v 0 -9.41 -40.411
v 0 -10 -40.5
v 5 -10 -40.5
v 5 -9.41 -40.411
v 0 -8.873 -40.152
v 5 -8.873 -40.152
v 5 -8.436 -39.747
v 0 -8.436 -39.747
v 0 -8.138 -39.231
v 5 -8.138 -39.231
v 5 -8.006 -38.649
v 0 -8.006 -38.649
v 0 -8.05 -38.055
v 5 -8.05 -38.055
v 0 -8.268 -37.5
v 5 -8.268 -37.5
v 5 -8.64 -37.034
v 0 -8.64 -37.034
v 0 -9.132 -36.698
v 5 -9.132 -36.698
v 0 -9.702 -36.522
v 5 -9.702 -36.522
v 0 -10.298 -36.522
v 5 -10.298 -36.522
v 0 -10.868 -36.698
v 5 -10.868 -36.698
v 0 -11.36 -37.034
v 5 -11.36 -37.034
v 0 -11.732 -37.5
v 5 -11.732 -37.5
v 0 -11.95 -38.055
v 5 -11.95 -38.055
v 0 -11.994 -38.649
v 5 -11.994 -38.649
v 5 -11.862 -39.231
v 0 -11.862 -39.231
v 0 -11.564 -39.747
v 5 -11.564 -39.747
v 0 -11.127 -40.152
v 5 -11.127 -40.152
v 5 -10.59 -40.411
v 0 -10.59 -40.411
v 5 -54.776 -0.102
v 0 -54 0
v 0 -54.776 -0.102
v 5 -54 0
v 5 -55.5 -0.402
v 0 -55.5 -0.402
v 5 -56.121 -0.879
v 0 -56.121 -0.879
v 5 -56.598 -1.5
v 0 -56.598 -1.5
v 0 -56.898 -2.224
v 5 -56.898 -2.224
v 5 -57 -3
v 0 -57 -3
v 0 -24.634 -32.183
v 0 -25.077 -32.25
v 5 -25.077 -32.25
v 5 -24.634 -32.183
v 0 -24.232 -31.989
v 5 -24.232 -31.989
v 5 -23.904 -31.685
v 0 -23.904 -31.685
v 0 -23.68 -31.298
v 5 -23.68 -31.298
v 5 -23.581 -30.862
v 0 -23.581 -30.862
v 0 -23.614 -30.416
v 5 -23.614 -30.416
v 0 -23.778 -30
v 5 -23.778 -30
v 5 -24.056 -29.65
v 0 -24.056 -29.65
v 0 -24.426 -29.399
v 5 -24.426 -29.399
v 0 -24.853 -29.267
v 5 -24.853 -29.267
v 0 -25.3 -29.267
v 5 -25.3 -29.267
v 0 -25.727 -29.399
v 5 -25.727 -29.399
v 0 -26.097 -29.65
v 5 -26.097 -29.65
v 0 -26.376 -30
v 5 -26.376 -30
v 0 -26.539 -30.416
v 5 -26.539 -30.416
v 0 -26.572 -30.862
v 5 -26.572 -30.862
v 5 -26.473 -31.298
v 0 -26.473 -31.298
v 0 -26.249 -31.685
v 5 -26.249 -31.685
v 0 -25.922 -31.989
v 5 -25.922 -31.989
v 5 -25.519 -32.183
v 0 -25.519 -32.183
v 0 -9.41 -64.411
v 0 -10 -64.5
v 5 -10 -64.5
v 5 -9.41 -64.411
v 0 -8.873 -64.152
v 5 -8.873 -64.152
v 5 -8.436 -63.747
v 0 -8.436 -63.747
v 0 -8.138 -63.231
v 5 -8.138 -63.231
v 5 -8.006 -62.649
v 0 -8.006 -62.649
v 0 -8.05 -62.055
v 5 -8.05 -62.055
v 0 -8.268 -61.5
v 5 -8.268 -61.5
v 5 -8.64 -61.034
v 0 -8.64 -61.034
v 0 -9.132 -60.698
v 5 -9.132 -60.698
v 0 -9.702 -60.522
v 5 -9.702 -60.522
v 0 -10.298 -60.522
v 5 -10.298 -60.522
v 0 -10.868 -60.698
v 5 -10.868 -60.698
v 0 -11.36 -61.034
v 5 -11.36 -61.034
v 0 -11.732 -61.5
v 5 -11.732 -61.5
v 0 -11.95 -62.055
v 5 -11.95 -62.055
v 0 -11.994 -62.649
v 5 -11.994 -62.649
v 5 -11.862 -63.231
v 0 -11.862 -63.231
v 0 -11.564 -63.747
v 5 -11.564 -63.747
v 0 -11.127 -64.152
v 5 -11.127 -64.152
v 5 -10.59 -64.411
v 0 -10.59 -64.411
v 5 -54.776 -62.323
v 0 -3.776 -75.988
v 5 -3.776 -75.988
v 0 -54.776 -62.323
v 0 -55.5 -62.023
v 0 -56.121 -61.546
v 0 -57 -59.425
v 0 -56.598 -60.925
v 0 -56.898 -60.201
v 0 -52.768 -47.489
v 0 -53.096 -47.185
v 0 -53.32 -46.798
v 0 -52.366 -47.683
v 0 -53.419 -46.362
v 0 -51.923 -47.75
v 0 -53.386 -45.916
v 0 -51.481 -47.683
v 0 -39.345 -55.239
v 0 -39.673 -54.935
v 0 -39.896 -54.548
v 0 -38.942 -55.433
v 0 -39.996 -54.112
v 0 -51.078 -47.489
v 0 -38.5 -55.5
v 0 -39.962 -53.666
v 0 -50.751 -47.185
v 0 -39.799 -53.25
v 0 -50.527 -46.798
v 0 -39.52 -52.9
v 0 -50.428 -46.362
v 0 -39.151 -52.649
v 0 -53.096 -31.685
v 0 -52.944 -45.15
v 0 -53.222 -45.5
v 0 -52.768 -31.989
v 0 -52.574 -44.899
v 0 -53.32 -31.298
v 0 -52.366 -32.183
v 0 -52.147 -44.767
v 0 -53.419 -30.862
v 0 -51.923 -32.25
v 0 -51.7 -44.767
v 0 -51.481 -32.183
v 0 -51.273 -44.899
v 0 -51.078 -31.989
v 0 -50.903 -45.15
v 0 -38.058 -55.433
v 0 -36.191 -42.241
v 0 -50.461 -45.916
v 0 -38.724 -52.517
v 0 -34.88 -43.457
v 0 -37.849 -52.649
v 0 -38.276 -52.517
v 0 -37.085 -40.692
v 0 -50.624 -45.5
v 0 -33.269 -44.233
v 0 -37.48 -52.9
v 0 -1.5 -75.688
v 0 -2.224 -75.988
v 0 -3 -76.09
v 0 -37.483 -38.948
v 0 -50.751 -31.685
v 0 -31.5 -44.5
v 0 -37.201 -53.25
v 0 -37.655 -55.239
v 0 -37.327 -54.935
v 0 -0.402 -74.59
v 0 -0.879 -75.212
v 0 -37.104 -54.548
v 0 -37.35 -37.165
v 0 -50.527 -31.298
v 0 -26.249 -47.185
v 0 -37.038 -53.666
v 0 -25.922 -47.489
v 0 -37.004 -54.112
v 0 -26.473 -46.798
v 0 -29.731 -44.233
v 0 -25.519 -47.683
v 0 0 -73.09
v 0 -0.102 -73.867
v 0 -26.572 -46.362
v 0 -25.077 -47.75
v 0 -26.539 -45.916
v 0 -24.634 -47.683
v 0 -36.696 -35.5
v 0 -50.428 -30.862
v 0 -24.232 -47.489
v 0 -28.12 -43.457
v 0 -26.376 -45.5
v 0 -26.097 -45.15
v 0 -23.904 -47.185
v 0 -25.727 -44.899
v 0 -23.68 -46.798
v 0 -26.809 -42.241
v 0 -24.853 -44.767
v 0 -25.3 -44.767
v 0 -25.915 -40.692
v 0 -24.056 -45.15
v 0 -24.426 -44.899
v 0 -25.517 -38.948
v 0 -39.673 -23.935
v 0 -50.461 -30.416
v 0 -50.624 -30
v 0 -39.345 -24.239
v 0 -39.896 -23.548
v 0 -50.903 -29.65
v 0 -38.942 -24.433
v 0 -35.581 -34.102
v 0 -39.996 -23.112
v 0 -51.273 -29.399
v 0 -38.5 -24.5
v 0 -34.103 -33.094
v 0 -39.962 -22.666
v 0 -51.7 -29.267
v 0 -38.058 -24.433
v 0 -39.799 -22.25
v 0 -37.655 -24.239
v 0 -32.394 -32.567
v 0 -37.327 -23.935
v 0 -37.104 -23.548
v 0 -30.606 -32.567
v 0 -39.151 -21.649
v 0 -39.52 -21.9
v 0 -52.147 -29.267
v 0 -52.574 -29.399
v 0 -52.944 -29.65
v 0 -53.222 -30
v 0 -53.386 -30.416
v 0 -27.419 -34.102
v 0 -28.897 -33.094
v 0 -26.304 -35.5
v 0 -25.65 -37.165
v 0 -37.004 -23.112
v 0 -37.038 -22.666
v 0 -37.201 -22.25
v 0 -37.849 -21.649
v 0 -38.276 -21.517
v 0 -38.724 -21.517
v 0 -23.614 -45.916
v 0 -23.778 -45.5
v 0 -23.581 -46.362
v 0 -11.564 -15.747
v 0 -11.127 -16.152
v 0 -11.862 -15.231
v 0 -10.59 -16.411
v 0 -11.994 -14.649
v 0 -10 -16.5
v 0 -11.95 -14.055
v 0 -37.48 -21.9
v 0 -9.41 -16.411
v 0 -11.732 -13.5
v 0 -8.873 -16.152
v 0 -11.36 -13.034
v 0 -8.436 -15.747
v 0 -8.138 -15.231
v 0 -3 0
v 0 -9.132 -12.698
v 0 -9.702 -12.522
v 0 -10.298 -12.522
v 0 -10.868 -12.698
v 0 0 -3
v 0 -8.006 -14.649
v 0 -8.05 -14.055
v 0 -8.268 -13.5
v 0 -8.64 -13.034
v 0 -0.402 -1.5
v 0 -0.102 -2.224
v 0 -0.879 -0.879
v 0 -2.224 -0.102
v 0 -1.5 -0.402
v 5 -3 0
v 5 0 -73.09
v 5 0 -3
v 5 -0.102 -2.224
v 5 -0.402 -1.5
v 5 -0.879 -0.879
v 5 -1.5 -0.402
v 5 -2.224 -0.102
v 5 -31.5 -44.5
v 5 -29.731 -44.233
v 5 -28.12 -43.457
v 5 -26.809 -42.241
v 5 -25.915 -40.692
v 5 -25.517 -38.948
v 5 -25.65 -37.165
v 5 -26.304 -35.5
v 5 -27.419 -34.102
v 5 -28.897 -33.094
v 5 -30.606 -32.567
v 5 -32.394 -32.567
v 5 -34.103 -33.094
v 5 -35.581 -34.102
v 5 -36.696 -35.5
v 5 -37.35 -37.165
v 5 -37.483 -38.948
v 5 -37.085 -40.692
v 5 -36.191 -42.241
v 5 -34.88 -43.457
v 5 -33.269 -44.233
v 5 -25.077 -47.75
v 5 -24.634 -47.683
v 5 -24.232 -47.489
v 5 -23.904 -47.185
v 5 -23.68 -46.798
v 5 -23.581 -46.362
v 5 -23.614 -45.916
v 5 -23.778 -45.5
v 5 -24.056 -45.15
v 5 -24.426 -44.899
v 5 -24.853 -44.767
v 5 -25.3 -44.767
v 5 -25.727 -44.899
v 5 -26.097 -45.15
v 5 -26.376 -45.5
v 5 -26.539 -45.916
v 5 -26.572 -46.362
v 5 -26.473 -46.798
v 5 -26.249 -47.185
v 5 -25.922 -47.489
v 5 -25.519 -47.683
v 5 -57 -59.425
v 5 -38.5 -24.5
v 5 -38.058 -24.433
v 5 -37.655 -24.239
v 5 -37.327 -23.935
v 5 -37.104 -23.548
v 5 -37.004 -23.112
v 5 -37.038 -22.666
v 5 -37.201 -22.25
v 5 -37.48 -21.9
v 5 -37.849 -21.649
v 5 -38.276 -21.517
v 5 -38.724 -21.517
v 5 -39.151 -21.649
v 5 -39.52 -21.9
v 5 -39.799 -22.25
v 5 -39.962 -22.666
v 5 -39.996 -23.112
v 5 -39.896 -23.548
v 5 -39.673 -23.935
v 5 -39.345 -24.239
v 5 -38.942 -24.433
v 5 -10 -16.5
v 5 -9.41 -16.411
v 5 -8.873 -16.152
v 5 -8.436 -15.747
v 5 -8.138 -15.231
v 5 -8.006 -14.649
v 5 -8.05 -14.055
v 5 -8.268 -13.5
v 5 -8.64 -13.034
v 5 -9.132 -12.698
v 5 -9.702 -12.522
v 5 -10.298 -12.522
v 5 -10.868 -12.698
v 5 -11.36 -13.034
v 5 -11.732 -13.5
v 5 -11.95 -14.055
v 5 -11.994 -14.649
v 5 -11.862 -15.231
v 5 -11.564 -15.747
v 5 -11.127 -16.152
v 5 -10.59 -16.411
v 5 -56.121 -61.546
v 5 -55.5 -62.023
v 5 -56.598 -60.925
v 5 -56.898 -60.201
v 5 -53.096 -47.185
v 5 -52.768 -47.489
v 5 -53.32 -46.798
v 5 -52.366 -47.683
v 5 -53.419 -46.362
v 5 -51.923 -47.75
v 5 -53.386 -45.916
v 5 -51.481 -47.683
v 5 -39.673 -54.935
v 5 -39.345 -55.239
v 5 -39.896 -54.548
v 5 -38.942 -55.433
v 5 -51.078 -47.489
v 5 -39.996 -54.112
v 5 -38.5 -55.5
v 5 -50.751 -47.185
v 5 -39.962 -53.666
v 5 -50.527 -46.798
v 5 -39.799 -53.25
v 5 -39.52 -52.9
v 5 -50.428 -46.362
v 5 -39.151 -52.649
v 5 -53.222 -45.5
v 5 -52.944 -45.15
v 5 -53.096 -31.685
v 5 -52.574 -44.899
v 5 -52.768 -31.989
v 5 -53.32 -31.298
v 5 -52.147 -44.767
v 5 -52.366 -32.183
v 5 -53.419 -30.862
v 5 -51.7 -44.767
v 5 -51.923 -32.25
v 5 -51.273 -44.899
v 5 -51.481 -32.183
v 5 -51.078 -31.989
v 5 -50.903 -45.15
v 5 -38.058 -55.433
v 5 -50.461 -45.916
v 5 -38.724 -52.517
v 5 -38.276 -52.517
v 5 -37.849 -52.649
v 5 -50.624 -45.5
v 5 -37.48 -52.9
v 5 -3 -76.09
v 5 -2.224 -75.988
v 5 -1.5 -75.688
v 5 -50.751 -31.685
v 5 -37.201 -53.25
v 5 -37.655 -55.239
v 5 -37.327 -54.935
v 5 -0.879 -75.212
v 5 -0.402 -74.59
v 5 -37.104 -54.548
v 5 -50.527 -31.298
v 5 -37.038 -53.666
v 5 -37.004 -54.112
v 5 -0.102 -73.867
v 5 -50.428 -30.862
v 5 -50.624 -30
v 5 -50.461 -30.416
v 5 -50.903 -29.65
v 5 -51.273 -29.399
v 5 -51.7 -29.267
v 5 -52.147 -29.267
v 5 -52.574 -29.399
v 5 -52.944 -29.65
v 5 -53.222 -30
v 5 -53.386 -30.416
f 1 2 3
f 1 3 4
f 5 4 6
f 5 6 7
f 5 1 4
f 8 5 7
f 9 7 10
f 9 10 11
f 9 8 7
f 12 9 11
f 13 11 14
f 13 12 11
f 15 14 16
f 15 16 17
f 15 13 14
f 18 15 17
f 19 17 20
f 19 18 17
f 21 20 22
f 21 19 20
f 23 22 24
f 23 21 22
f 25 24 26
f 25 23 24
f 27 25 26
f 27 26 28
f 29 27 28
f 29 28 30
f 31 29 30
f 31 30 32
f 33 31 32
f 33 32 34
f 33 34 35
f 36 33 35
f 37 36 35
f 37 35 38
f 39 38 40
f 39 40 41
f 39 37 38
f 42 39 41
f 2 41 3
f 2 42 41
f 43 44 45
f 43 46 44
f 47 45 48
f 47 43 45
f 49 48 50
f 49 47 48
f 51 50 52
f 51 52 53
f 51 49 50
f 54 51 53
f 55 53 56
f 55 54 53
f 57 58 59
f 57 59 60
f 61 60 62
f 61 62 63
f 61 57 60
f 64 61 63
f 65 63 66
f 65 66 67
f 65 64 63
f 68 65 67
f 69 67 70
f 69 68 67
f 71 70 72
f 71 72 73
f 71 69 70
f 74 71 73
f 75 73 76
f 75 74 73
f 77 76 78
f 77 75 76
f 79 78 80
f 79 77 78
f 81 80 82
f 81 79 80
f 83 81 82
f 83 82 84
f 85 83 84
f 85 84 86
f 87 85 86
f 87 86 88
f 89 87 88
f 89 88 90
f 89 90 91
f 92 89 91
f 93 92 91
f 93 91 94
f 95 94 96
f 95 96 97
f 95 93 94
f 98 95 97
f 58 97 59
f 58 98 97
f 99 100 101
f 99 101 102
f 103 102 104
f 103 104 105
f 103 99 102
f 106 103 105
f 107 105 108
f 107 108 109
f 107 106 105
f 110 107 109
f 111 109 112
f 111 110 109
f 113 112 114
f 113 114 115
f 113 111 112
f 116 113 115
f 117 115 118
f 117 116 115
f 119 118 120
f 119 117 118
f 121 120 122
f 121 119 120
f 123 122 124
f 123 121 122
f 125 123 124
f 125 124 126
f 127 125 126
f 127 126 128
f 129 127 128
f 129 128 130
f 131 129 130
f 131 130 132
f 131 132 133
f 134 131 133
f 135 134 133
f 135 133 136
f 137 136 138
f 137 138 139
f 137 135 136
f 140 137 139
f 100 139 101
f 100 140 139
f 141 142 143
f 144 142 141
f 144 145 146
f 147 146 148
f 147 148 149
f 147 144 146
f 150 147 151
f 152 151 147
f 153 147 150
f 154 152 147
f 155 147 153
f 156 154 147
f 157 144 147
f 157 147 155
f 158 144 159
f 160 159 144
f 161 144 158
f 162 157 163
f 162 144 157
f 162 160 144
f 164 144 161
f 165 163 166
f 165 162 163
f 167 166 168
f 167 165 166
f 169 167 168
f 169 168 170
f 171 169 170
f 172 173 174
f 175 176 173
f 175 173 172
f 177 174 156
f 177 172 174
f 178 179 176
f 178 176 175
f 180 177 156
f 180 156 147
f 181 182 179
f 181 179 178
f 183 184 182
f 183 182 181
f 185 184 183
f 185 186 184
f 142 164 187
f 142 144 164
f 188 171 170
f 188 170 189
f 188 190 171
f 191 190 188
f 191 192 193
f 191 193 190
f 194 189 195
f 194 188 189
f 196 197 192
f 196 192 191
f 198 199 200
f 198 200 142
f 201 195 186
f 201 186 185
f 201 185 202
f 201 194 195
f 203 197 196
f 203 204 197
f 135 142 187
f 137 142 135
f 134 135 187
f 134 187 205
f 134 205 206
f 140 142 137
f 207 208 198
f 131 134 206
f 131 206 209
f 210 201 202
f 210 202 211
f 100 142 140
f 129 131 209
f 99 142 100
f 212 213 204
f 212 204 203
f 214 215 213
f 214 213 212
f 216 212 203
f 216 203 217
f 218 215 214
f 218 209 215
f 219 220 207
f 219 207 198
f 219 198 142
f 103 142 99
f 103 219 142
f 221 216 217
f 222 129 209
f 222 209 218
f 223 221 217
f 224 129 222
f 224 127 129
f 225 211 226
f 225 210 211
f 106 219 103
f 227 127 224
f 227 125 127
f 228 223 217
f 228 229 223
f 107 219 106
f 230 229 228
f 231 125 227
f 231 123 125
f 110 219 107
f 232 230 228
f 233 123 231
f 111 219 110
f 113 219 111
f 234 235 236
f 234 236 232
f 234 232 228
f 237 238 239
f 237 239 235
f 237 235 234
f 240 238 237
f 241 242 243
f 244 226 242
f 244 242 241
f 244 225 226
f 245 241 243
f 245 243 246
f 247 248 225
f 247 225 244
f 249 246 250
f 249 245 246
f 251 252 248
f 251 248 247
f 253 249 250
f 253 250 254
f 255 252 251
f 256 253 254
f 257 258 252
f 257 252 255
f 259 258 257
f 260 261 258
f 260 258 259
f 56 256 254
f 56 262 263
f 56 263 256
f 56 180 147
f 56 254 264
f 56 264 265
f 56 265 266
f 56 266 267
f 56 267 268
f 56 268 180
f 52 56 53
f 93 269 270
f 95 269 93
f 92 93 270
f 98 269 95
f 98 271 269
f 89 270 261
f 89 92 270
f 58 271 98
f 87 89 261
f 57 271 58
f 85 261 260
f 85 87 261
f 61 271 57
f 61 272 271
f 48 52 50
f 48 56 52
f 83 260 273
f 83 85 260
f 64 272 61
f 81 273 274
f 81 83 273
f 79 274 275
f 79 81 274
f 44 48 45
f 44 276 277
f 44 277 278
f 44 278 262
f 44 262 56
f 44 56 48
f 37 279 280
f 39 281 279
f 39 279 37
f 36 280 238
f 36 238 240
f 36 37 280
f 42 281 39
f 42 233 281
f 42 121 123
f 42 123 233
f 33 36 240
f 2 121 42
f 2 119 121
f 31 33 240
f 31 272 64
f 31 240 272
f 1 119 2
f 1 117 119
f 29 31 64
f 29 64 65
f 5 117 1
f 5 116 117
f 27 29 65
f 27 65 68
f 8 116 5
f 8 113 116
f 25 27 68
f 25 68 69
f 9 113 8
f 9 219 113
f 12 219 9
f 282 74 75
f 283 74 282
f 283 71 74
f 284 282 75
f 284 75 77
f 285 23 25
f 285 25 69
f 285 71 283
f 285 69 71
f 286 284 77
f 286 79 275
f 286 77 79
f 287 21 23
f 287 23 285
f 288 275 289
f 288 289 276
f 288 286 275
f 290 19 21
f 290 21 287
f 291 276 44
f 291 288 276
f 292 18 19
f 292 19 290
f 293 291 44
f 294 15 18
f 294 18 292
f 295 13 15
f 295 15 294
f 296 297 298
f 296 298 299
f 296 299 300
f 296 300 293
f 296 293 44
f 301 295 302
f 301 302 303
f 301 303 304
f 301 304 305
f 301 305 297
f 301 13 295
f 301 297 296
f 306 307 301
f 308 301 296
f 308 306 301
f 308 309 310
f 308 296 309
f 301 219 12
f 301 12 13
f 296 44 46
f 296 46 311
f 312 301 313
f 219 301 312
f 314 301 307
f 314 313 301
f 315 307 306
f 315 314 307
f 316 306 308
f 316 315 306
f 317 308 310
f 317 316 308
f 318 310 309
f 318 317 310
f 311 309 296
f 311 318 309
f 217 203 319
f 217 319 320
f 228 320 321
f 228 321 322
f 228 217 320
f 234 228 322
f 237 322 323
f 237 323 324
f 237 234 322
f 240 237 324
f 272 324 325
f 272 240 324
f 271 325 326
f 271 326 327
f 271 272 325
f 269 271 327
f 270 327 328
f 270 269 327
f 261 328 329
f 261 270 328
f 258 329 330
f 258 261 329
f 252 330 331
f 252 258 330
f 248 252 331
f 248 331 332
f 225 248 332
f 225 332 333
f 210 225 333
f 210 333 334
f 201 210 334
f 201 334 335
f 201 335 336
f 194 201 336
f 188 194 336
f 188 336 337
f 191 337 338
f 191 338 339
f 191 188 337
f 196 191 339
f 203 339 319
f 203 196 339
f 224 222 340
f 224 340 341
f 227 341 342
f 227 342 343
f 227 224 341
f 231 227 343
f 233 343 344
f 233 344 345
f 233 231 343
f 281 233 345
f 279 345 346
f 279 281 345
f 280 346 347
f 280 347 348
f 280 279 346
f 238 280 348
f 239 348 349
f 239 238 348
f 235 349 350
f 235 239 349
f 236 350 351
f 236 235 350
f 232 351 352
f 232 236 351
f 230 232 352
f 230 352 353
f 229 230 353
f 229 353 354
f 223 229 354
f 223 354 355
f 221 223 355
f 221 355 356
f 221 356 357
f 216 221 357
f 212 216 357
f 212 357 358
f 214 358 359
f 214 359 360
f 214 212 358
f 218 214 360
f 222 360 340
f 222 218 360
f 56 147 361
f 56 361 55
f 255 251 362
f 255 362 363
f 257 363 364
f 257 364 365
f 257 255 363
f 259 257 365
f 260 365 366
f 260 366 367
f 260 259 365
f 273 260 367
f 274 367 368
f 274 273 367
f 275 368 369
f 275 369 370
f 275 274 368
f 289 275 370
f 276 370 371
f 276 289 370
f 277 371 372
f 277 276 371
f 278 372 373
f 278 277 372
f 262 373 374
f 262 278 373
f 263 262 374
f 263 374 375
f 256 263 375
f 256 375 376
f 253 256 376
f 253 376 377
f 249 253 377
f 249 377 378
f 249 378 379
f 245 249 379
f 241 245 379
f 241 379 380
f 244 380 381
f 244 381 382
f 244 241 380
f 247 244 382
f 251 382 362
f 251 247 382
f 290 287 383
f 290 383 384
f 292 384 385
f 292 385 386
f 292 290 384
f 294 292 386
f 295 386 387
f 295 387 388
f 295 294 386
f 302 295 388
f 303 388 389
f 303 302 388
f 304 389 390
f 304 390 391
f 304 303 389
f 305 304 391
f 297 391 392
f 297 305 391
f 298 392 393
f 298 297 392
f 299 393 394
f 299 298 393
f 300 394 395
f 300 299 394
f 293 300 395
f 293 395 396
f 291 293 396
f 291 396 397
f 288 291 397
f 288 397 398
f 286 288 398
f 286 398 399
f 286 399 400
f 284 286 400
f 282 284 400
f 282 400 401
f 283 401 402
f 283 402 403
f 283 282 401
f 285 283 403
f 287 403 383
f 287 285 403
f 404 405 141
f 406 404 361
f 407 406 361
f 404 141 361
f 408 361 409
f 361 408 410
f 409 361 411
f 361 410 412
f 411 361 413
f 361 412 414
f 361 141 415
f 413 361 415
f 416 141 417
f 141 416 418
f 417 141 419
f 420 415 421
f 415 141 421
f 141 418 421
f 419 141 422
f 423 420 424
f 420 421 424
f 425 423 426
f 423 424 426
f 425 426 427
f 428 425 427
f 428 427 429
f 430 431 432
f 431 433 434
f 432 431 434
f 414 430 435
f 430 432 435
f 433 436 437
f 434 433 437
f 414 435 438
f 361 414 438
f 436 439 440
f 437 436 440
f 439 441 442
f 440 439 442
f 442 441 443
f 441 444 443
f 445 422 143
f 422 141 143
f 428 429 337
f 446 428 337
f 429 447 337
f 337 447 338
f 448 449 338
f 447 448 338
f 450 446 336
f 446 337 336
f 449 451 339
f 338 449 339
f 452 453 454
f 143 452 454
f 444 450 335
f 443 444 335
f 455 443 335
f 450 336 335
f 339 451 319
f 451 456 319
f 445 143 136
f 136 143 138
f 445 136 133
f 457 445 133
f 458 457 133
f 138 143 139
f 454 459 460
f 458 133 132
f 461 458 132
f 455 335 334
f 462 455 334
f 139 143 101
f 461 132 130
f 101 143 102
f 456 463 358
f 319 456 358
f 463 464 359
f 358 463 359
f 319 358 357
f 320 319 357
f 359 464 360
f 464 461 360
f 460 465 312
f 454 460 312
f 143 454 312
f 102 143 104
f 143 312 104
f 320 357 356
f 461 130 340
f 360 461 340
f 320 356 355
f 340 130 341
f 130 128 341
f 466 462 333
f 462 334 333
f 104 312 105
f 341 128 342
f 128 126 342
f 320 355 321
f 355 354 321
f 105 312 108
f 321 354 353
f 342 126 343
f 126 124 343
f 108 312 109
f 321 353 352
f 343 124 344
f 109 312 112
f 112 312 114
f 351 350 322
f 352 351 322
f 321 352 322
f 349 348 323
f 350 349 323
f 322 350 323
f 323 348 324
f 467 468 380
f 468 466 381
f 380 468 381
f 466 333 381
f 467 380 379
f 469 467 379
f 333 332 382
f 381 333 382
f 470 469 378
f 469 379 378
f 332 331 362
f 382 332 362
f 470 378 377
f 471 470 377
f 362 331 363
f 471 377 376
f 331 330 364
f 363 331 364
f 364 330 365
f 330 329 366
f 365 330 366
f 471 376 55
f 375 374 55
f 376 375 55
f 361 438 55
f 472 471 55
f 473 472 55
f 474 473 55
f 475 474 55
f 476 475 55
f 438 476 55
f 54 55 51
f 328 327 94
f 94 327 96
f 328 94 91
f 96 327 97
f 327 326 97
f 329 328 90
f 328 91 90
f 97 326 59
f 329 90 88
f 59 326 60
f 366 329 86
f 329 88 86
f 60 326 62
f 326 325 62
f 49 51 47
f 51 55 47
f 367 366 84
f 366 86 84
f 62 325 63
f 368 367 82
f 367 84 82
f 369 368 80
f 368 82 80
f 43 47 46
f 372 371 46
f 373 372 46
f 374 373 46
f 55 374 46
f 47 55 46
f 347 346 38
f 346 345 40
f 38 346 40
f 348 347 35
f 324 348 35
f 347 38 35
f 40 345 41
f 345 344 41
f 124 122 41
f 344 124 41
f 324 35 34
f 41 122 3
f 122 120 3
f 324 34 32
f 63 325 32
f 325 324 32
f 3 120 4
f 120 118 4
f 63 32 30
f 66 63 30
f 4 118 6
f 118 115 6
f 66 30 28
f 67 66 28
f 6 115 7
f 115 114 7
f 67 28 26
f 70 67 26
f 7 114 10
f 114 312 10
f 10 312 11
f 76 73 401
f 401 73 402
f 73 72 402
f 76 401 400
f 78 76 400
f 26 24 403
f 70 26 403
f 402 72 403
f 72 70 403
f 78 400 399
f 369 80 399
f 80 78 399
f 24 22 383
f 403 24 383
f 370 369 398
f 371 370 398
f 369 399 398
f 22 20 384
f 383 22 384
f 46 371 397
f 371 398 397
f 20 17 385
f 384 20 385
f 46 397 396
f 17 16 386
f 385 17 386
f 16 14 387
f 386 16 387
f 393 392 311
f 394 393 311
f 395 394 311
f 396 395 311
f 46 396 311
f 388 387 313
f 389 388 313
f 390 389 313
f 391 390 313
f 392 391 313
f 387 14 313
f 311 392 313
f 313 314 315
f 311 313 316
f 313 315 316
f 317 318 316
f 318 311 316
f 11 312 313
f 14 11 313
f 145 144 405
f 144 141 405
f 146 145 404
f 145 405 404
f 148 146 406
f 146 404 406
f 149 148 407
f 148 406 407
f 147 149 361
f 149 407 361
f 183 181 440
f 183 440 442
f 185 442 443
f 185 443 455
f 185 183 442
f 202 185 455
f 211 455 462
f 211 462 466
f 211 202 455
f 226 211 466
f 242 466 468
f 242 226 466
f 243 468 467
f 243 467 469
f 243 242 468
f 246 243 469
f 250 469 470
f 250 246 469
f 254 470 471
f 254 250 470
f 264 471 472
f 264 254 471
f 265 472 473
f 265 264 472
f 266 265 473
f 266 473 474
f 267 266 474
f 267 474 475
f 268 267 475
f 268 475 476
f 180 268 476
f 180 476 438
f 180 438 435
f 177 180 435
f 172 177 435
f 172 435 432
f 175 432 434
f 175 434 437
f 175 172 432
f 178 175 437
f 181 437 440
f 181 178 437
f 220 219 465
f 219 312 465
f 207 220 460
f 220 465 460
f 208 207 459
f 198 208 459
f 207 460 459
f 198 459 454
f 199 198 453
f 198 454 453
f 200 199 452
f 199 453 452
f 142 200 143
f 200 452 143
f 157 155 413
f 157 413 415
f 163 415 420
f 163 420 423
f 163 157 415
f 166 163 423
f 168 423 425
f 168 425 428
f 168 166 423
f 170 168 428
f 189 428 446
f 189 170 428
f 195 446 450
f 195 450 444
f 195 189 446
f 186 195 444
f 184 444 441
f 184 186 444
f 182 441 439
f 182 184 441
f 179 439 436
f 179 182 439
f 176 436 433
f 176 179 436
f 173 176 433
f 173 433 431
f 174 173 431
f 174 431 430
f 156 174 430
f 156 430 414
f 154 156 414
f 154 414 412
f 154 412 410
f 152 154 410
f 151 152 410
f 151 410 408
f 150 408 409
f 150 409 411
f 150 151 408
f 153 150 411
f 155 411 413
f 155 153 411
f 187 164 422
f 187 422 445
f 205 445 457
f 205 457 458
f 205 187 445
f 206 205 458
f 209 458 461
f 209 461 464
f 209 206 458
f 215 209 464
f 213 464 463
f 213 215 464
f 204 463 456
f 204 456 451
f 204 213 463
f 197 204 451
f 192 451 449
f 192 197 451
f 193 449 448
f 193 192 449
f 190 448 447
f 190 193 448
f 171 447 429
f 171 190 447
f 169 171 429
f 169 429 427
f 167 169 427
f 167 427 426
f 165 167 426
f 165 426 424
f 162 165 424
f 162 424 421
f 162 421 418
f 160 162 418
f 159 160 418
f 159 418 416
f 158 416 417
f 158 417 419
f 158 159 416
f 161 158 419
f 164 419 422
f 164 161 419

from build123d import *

# Parameters (mm, degrees)
SKETCH1_R           = 6
SKETCH1_R_2         = 2
SKETCH1_R_3         = 1.5
BOSS_EXTRUDE1_DEPTH = 5
FILLET1_R           = 3


with BuildPart() as part:
    # Sketch1 → Boss-Extrude1 (new body)
    with BuildSketch(Plane(origin=(0, 0, 0), x_dir=(0, 0, -1), z_dir=(1, 0, 0))):
        Polygon((0, 0), (77, 0), (61.726896031, -57), (0, -57), align=None)
        with Locations((38.5, -31.5)):
            Circle(SKETCH1_R, mode=Mode.SUBTRACT)
        with Locations((38.5, -10)):
            Circle(SKETCH1_R_2, mode=Mode.SUBTRACT)
        with Locations((62.5, -10)):
            Circle(SKETCH1_R_2, mode=Mode.SUBTRACT)
        with Locations((14.5, -10)):
            Circle(SKETCH1_R_2, mode=Mode.SUBTRACT)
        with Locations((23, -38.5)):
            Circle(SKETCH1_R_3, mode=Mode.SUBTRACT)
        with Locations((30.75, -25.076606241)):
            Circle(SKETCH1_R_3, mode=Mode.SUBTRACT)
        with Locations((46.25, -25.076606241)):
            Circle(SKETCH1_R_3, mode=Mode.SUBTRACT)
        with Locations((54, -38.5)):
            Circle(SKETCH1_R_3, mode=Mode.SUBTRACT)
        with Locations((46.25, -51.923393759)):
            Circle(SKETCH1_R_3, mode=Mode.SUBTRACT)
        with Locations((30.75, -51.923393759)):
            Circle(SKETCH1_R_3, mode=Mode.SUBTRACT)
    extrude(amount=BOSS_EXTRUDE1_DEPTH)

    # Fillet1
    fillet1_edges = [part.edges().sort_by_distance(p)[0] for p in [
        (2.5, 0, 0),
        (2.5, 0, -77),
        (2.5, -57, -61.726896031),
        (2.5, -57, 0),
    ]]
    fillet(fillet1_edges, radius=FILLET1_R)


solid = part.part
